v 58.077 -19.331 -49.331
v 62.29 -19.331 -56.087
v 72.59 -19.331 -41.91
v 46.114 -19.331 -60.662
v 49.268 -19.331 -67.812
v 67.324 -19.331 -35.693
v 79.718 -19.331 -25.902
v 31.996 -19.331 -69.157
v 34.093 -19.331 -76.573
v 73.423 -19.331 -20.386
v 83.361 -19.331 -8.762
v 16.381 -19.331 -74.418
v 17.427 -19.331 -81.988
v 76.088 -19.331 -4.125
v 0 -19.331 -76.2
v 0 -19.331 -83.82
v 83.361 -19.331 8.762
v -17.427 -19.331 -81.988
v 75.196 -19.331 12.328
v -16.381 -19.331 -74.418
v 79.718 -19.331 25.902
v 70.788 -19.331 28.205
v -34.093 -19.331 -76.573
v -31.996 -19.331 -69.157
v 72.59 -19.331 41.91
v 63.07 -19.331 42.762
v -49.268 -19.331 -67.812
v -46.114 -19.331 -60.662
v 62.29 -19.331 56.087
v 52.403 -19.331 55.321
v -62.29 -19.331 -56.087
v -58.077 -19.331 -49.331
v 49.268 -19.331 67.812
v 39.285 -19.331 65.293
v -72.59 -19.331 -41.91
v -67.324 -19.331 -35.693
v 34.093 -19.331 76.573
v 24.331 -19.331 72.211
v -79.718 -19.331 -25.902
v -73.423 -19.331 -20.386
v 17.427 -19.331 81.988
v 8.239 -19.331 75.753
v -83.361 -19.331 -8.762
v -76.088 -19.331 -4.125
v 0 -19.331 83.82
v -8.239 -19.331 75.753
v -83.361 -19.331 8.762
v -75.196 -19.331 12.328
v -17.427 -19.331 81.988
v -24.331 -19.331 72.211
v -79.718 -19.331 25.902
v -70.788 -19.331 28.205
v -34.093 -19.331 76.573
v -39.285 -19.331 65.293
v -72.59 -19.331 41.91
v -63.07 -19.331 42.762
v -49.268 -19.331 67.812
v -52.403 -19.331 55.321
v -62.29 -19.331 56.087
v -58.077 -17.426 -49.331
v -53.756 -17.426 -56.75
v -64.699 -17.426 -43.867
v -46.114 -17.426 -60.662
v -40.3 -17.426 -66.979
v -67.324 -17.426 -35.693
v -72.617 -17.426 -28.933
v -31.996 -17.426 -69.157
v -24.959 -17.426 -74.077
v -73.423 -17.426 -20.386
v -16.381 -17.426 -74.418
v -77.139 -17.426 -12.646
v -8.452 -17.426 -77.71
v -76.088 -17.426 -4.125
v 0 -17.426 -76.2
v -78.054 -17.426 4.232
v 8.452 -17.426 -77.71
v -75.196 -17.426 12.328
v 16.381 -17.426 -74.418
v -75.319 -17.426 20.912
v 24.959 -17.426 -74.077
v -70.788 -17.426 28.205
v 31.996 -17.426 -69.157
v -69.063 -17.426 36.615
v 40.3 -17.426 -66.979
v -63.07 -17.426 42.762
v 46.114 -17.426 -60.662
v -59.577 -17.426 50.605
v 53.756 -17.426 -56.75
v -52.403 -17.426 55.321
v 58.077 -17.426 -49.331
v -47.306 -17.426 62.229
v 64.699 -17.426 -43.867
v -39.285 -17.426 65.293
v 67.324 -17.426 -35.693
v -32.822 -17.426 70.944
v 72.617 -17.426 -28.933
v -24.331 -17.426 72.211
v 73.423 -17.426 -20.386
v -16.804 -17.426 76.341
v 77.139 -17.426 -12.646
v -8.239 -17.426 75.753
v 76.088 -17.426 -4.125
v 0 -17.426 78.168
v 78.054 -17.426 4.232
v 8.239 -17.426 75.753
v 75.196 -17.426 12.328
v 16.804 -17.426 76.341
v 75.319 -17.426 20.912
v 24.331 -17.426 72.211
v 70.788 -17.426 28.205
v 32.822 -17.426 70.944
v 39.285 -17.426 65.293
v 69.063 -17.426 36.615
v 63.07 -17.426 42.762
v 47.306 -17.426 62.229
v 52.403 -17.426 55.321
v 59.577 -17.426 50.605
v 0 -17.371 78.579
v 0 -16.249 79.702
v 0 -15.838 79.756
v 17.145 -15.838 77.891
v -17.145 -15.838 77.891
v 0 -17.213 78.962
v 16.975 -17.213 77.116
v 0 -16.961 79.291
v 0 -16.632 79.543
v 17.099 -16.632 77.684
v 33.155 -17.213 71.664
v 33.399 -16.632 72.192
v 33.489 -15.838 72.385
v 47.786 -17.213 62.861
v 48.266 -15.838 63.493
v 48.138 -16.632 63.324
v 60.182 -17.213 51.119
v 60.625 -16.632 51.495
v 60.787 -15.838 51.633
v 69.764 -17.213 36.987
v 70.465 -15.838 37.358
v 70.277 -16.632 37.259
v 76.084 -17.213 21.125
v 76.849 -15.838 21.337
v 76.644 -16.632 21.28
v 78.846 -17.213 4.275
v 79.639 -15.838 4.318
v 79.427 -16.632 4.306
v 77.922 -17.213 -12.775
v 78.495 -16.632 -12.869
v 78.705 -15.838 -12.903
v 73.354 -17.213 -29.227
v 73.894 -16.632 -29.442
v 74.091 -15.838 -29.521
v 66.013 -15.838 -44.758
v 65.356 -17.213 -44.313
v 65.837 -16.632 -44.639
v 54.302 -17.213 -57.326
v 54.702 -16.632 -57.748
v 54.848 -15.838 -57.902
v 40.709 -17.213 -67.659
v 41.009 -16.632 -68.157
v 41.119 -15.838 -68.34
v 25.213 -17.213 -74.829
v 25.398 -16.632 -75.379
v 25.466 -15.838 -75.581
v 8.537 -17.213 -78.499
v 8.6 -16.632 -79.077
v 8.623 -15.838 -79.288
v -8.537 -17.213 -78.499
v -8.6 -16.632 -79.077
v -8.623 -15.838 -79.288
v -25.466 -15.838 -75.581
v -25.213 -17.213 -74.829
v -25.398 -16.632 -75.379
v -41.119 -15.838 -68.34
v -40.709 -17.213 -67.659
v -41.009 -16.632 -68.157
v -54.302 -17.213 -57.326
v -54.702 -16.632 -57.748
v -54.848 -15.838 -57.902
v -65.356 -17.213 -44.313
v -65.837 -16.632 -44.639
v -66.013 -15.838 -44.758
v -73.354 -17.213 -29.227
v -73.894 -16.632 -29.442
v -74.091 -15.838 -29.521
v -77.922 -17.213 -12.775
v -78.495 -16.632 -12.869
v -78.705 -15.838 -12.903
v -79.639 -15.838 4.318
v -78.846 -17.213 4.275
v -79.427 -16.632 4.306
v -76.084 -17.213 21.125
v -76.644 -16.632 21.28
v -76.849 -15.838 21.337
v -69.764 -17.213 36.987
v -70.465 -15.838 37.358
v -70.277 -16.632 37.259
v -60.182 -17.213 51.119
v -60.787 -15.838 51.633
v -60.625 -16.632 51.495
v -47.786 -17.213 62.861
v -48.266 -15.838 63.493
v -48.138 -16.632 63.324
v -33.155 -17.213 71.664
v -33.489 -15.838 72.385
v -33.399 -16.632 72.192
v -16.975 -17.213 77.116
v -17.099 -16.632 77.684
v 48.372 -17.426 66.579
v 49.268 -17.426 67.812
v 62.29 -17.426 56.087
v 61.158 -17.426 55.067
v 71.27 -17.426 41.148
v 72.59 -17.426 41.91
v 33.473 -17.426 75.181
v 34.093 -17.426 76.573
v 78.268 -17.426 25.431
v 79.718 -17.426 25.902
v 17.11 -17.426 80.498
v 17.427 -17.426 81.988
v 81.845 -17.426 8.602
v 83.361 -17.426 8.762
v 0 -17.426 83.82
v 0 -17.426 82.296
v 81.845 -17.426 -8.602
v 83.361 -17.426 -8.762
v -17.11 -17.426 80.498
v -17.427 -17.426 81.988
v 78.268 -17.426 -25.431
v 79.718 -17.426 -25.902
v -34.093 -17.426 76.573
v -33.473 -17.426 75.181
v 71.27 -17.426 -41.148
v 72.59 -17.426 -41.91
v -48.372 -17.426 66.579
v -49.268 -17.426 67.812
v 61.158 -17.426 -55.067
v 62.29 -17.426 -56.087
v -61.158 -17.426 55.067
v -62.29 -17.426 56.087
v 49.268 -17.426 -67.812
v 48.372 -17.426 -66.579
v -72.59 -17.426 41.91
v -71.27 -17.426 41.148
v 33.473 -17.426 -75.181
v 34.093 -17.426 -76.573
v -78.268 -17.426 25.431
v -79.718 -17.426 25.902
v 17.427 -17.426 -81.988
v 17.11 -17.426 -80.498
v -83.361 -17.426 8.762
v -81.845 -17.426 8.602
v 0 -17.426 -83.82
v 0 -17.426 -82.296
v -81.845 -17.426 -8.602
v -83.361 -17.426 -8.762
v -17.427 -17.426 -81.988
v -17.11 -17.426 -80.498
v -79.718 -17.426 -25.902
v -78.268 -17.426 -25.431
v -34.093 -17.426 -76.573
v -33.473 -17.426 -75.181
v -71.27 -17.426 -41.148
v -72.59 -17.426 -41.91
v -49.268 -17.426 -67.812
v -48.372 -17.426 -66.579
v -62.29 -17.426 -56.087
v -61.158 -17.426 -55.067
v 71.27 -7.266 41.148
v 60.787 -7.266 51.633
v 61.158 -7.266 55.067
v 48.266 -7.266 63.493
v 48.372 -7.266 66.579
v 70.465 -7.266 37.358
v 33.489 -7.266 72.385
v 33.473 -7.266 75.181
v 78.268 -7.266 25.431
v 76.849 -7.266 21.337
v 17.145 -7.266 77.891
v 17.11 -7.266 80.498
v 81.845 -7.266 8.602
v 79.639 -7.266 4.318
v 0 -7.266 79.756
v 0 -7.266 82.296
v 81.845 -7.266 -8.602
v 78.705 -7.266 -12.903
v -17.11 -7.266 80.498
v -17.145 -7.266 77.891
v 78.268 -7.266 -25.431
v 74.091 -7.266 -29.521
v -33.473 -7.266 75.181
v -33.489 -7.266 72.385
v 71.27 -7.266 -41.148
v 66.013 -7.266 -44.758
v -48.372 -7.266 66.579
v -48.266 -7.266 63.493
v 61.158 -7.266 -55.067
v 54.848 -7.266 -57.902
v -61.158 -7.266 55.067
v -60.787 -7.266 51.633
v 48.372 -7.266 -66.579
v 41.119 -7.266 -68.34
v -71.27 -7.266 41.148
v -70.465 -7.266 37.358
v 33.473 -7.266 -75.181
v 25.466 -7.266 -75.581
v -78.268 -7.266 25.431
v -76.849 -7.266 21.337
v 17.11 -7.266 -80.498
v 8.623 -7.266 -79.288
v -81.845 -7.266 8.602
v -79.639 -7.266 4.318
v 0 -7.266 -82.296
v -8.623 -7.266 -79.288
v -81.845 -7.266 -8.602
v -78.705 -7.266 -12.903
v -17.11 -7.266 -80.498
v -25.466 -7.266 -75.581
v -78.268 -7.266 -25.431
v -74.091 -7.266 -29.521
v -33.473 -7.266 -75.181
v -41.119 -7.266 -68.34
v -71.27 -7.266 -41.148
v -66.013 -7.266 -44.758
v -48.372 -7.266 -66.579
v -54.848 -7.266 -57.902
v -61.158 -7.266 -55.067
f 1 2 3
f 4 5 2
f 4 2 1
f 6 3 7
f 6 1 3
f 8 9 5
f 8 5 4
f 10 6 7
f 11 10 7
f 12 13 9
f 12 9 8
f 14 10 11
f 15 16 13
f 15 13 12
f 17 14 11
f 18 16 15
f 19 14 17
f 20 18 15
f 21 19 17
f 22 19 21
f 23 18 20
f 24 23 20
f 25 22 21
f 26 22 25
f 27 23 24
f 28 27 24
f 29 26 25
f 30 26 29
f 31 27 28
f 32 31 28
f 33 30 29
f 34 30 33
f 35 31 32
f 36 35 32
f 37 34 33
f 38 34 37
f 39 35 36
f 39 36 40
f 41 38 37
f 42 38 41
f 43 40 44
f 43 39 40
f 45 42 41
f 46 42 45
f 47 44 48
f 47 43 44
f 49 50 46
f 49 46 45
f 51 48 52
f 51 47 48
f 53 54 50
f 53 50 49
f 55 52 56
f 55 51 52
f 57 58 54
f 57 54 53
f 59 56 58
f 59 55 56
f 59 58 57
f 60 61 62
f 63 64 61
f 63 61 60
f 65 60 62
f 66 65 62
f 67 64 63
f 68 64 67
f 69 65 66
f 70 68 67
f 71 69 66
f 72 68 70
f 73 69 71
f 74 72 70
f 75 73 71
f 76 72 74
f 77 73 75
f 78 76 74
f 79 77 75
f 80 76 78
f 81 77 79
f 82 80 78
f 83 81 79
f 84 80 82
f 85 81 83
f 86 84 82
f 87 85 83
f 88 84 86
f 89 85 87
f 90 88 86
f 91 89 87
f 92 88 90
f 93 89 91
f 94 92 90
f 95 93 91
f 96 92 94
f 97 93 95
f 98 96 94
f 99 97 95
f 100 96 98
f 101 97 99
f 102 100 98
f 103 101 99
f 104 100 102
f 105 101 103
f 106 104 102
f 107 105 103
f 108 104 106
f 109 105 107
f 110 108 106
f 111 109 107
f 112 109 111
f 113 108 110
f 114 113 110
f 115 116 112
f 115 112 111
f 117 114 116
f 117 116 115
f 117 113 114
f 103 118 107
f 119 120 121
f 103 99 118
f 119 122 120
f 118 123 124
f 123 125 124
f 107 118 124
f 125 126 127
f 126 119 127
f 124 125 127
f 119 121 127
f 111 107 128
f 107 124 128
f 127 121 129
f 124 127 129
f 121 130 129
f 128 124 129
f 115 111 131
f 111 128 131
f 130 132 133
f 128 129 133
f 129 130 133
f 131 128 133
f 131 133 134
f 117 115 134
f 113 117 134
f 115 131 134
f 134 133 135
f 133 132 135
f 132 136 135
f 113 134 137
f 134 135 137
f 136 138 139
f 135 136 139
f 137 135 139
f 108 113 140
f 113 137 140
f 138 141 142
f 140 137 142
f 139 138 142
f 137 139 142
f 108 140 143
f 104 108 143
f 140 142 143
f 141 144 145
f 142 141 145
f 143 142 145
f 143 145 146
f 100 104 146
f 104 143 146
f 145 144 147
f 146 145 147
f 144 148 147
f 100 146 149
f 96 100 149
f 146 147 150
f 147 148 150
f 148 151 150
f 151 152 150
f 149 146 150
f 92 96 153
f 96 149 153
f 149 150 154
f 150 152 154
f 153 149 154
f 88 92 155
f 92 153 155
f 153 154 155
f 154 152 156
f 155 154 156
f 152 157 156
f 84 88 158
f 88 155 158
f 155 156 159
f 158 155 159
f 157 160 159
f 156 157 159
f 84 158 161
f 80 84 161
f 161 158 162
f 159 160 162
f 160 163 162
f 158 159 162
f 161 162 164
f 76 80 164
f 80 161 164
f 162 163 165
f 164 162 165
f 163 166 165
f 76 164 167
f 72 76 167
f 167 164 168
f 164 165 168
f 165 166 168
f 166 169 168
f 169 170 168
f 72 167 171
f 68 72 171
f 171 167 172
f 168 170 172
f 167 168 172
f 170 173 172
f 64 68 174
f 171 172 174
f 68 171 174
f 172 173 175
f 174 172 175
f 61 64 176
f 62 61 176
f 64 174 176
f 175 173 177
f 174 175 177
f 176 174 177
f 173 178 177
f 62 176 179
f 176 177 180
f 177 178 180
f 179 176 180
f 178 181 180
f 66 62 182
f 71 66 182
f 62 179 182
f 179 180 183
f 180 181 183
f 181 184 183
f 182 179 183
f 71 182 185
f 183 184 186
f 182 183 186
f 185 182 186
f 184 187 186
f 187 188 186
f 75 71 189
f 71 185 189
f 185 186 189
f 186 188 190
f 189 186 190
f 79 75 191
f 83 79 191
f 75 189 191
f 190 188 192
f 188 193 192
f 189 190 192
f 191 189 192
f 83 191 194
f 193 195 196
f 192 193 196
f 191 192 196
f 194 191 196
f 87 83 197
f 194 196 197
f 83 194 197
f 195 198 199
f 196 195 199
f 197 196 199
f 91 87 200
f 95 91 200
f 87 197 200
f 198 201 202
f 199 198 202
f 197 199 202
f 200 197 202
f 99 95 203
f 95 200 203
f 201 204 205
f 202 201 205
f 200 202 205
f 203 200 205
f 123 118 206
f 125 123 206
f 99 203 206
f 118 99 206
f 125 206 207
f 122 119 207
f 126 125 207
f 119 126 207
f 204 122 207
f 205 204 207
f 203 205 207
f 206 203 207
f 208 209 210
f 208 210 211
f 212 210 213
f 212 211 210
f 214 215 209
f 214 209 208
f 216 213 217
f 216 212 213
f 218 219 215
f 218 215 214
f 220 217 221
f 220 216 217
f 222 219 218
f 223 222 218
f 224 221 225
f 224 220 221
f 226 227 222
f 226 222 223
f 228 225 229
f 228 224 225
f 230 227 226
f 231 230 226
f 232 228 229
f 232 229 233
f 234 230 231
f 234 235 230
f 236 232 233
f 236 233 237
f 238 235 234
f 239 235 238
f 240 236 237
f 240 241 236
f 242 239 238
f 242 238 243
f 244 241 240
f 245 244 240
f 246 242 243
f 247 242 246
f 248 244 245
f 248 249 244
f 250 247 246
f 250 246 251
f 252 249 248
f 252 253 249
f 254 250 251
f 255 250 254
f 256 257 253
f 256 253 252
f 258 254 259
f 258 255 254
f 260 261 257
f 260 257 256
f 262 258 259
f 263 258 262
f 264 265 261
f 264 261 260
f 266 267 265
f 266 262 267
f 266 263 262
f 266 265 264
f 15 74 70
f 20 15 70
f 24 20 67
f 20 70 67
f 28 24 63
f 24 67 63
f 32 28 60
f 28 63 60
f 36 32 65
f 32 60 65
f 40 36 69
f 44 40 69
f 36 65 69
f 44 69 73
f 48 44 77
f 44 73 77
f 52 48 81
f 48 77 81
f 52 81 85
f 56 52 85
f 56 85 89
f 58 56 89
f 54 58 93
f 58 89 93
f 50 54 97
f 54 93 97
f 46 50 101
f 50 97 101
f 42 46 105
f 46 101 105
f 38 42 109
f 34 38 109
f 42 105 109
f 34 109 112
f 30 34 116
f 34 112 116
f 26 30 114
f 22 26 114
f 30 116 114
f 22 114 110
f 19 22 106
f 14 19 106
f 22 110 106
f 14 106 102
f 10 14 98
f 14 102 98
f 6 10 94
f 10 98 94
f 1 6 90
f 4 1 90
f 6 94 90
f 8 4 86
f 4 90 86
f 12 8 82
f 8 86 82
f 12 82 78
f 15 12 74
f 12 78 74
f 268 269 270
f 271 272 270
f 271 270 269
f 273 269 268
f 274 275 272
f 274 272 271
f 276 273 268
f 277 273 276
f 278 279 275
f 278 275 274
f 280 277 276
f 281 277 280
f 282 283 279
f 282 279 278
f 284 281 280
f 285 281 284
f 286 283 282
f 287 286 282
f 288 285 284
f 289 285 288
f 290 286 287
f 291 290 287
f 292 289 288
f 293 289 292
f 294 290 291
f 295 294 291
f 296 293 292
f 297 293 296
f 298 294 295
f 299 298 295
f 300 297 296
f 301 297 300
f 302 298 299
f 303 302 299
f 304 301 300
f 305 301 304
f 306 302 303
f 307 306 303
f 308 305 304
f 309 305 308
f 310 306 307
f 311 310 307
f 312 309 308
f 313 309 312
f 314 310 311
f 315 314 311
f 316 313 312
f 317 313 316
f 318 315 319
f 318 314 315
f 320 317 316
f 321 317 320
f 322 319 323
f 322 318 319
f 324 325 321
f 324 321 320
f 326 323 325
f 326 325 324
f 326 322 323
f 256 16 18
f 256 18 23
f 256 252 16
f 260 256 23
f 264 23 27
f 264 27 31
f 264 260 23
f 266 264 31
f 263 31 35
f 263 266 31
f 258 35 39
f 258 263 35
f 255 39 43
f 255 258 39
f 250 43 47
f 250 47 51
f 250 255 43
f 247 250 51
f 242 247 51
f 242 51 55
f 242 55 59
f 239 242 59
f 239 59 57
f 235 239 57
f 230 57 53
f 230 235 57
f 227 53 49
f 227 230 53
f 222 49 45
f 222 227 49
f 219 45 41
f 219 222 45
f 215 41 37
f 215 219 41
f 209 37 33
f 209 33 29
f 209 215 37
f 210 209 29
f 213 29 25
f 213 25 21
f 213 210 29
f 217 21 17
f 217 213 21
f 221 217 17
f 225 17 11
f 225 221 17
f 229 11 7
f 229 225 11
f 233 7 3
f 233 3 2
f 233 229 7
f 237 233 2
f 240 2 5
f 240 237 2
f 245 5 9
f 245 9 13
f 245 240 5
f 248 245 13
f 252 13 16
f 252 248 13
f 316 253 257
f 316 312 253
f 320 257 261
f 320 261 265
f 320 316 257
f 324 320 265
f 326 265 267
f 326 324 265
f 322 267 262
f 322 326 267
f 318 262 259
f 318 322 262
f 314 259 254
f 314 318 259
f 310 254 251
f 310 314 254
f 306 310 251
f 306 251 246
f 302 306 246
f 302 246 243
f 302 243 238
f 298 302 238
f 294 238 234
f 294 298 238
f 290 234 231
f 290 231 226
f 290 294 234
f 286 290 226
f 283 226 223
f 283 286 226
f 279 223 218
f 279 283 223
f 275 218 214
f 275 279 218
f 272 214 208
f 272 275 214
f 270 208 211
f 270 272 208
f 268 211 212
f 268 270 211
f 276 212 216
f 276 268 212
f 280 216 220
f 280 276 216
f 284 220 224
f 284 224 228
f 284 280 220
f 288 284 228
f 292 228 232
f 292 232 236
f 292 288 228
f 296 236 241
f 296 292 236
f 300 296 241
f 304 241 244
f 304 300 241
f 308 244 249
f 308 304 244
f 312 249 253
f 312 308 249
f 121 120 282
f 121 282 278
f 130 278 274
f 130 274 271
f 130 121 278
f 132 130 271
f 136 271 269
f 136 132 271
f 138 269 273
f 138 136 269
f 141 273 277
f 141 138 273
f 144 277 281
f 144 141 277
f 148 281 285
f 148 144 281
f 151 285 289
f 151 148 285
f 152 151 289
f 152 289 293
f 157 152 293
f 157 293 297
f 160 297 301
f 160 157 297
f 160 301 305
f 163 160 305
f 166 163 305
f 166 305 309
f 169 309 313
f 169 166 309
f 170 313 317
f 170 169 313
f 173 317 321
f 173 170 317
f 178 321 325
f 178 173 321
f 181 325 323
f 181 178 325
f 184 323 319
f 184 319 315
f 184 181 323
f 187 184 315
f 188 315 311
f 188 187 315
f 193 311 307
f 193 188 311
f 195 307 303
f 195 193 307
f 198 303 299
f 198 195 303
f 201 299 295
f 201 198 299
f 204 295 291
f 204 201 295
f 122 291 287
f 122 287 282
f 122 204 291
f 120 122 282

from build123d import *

# Parameters (mm, degrees)
CUT_EXTRUDE1_START = -10.16
SKETCH2_R          = 79.756
SKETCH2_R_2        = 76.2
CUT_EXTRUDE1_DEPTH = 10.16
FILLET1_R          = 1.5875


with BuildPart() as part:
    # Sketch1 → Revolve1 (revolve)
    with BuildSketch(Plane.XY, mode=Mode.PRIVATE) as revolve1_sk:
        Polygon((-83.82, -19.330547638), (-83.82, -17.425547638), (-82.296, -17.425547638), (-82.296, -7.265547638), (-76.2, -7.265547638), (-76.2, -17.425547638), (-76.2, -19.330547638), align=None)
    revolve(revolve1_sk.sketch.rotate(Axis((0, 0, 0), (0, 1, 0)), 270), axis=Axis((0, 0, 0), (0, 1, 0)))

    # Sketch2 → Cut-Extrude1 (cut)
    with BuildSketch(Plane(origin=(0, -7.265547638, 0), x_dir=(1, 0, 0), z_dir=(0, 1, 0)).offset(CUT_EXTRUDE1_START)):
        with Locations(Location((0, 0, 0), (0, 0, 270))):
            Circle(SKETCH2_R)
        with Locations(Location((0, 0, 0), (0, 0, 90))):
            Circle(SKETCH2_R_2, mode=Mode.SUBTRACT)
    extrude(amount=CUT_EXTRUDE1_DEPTH, mode=Mode.SUBTRACT)

    # Fillet1
    fillet1_edges = [part.edges().sort_by_distance(p)[0] for p in [
        (0, -17.425547638, -79.756),
    ]]
    fillet(fillet1_edges, radius=FILLET1_R)


solid = part.part
